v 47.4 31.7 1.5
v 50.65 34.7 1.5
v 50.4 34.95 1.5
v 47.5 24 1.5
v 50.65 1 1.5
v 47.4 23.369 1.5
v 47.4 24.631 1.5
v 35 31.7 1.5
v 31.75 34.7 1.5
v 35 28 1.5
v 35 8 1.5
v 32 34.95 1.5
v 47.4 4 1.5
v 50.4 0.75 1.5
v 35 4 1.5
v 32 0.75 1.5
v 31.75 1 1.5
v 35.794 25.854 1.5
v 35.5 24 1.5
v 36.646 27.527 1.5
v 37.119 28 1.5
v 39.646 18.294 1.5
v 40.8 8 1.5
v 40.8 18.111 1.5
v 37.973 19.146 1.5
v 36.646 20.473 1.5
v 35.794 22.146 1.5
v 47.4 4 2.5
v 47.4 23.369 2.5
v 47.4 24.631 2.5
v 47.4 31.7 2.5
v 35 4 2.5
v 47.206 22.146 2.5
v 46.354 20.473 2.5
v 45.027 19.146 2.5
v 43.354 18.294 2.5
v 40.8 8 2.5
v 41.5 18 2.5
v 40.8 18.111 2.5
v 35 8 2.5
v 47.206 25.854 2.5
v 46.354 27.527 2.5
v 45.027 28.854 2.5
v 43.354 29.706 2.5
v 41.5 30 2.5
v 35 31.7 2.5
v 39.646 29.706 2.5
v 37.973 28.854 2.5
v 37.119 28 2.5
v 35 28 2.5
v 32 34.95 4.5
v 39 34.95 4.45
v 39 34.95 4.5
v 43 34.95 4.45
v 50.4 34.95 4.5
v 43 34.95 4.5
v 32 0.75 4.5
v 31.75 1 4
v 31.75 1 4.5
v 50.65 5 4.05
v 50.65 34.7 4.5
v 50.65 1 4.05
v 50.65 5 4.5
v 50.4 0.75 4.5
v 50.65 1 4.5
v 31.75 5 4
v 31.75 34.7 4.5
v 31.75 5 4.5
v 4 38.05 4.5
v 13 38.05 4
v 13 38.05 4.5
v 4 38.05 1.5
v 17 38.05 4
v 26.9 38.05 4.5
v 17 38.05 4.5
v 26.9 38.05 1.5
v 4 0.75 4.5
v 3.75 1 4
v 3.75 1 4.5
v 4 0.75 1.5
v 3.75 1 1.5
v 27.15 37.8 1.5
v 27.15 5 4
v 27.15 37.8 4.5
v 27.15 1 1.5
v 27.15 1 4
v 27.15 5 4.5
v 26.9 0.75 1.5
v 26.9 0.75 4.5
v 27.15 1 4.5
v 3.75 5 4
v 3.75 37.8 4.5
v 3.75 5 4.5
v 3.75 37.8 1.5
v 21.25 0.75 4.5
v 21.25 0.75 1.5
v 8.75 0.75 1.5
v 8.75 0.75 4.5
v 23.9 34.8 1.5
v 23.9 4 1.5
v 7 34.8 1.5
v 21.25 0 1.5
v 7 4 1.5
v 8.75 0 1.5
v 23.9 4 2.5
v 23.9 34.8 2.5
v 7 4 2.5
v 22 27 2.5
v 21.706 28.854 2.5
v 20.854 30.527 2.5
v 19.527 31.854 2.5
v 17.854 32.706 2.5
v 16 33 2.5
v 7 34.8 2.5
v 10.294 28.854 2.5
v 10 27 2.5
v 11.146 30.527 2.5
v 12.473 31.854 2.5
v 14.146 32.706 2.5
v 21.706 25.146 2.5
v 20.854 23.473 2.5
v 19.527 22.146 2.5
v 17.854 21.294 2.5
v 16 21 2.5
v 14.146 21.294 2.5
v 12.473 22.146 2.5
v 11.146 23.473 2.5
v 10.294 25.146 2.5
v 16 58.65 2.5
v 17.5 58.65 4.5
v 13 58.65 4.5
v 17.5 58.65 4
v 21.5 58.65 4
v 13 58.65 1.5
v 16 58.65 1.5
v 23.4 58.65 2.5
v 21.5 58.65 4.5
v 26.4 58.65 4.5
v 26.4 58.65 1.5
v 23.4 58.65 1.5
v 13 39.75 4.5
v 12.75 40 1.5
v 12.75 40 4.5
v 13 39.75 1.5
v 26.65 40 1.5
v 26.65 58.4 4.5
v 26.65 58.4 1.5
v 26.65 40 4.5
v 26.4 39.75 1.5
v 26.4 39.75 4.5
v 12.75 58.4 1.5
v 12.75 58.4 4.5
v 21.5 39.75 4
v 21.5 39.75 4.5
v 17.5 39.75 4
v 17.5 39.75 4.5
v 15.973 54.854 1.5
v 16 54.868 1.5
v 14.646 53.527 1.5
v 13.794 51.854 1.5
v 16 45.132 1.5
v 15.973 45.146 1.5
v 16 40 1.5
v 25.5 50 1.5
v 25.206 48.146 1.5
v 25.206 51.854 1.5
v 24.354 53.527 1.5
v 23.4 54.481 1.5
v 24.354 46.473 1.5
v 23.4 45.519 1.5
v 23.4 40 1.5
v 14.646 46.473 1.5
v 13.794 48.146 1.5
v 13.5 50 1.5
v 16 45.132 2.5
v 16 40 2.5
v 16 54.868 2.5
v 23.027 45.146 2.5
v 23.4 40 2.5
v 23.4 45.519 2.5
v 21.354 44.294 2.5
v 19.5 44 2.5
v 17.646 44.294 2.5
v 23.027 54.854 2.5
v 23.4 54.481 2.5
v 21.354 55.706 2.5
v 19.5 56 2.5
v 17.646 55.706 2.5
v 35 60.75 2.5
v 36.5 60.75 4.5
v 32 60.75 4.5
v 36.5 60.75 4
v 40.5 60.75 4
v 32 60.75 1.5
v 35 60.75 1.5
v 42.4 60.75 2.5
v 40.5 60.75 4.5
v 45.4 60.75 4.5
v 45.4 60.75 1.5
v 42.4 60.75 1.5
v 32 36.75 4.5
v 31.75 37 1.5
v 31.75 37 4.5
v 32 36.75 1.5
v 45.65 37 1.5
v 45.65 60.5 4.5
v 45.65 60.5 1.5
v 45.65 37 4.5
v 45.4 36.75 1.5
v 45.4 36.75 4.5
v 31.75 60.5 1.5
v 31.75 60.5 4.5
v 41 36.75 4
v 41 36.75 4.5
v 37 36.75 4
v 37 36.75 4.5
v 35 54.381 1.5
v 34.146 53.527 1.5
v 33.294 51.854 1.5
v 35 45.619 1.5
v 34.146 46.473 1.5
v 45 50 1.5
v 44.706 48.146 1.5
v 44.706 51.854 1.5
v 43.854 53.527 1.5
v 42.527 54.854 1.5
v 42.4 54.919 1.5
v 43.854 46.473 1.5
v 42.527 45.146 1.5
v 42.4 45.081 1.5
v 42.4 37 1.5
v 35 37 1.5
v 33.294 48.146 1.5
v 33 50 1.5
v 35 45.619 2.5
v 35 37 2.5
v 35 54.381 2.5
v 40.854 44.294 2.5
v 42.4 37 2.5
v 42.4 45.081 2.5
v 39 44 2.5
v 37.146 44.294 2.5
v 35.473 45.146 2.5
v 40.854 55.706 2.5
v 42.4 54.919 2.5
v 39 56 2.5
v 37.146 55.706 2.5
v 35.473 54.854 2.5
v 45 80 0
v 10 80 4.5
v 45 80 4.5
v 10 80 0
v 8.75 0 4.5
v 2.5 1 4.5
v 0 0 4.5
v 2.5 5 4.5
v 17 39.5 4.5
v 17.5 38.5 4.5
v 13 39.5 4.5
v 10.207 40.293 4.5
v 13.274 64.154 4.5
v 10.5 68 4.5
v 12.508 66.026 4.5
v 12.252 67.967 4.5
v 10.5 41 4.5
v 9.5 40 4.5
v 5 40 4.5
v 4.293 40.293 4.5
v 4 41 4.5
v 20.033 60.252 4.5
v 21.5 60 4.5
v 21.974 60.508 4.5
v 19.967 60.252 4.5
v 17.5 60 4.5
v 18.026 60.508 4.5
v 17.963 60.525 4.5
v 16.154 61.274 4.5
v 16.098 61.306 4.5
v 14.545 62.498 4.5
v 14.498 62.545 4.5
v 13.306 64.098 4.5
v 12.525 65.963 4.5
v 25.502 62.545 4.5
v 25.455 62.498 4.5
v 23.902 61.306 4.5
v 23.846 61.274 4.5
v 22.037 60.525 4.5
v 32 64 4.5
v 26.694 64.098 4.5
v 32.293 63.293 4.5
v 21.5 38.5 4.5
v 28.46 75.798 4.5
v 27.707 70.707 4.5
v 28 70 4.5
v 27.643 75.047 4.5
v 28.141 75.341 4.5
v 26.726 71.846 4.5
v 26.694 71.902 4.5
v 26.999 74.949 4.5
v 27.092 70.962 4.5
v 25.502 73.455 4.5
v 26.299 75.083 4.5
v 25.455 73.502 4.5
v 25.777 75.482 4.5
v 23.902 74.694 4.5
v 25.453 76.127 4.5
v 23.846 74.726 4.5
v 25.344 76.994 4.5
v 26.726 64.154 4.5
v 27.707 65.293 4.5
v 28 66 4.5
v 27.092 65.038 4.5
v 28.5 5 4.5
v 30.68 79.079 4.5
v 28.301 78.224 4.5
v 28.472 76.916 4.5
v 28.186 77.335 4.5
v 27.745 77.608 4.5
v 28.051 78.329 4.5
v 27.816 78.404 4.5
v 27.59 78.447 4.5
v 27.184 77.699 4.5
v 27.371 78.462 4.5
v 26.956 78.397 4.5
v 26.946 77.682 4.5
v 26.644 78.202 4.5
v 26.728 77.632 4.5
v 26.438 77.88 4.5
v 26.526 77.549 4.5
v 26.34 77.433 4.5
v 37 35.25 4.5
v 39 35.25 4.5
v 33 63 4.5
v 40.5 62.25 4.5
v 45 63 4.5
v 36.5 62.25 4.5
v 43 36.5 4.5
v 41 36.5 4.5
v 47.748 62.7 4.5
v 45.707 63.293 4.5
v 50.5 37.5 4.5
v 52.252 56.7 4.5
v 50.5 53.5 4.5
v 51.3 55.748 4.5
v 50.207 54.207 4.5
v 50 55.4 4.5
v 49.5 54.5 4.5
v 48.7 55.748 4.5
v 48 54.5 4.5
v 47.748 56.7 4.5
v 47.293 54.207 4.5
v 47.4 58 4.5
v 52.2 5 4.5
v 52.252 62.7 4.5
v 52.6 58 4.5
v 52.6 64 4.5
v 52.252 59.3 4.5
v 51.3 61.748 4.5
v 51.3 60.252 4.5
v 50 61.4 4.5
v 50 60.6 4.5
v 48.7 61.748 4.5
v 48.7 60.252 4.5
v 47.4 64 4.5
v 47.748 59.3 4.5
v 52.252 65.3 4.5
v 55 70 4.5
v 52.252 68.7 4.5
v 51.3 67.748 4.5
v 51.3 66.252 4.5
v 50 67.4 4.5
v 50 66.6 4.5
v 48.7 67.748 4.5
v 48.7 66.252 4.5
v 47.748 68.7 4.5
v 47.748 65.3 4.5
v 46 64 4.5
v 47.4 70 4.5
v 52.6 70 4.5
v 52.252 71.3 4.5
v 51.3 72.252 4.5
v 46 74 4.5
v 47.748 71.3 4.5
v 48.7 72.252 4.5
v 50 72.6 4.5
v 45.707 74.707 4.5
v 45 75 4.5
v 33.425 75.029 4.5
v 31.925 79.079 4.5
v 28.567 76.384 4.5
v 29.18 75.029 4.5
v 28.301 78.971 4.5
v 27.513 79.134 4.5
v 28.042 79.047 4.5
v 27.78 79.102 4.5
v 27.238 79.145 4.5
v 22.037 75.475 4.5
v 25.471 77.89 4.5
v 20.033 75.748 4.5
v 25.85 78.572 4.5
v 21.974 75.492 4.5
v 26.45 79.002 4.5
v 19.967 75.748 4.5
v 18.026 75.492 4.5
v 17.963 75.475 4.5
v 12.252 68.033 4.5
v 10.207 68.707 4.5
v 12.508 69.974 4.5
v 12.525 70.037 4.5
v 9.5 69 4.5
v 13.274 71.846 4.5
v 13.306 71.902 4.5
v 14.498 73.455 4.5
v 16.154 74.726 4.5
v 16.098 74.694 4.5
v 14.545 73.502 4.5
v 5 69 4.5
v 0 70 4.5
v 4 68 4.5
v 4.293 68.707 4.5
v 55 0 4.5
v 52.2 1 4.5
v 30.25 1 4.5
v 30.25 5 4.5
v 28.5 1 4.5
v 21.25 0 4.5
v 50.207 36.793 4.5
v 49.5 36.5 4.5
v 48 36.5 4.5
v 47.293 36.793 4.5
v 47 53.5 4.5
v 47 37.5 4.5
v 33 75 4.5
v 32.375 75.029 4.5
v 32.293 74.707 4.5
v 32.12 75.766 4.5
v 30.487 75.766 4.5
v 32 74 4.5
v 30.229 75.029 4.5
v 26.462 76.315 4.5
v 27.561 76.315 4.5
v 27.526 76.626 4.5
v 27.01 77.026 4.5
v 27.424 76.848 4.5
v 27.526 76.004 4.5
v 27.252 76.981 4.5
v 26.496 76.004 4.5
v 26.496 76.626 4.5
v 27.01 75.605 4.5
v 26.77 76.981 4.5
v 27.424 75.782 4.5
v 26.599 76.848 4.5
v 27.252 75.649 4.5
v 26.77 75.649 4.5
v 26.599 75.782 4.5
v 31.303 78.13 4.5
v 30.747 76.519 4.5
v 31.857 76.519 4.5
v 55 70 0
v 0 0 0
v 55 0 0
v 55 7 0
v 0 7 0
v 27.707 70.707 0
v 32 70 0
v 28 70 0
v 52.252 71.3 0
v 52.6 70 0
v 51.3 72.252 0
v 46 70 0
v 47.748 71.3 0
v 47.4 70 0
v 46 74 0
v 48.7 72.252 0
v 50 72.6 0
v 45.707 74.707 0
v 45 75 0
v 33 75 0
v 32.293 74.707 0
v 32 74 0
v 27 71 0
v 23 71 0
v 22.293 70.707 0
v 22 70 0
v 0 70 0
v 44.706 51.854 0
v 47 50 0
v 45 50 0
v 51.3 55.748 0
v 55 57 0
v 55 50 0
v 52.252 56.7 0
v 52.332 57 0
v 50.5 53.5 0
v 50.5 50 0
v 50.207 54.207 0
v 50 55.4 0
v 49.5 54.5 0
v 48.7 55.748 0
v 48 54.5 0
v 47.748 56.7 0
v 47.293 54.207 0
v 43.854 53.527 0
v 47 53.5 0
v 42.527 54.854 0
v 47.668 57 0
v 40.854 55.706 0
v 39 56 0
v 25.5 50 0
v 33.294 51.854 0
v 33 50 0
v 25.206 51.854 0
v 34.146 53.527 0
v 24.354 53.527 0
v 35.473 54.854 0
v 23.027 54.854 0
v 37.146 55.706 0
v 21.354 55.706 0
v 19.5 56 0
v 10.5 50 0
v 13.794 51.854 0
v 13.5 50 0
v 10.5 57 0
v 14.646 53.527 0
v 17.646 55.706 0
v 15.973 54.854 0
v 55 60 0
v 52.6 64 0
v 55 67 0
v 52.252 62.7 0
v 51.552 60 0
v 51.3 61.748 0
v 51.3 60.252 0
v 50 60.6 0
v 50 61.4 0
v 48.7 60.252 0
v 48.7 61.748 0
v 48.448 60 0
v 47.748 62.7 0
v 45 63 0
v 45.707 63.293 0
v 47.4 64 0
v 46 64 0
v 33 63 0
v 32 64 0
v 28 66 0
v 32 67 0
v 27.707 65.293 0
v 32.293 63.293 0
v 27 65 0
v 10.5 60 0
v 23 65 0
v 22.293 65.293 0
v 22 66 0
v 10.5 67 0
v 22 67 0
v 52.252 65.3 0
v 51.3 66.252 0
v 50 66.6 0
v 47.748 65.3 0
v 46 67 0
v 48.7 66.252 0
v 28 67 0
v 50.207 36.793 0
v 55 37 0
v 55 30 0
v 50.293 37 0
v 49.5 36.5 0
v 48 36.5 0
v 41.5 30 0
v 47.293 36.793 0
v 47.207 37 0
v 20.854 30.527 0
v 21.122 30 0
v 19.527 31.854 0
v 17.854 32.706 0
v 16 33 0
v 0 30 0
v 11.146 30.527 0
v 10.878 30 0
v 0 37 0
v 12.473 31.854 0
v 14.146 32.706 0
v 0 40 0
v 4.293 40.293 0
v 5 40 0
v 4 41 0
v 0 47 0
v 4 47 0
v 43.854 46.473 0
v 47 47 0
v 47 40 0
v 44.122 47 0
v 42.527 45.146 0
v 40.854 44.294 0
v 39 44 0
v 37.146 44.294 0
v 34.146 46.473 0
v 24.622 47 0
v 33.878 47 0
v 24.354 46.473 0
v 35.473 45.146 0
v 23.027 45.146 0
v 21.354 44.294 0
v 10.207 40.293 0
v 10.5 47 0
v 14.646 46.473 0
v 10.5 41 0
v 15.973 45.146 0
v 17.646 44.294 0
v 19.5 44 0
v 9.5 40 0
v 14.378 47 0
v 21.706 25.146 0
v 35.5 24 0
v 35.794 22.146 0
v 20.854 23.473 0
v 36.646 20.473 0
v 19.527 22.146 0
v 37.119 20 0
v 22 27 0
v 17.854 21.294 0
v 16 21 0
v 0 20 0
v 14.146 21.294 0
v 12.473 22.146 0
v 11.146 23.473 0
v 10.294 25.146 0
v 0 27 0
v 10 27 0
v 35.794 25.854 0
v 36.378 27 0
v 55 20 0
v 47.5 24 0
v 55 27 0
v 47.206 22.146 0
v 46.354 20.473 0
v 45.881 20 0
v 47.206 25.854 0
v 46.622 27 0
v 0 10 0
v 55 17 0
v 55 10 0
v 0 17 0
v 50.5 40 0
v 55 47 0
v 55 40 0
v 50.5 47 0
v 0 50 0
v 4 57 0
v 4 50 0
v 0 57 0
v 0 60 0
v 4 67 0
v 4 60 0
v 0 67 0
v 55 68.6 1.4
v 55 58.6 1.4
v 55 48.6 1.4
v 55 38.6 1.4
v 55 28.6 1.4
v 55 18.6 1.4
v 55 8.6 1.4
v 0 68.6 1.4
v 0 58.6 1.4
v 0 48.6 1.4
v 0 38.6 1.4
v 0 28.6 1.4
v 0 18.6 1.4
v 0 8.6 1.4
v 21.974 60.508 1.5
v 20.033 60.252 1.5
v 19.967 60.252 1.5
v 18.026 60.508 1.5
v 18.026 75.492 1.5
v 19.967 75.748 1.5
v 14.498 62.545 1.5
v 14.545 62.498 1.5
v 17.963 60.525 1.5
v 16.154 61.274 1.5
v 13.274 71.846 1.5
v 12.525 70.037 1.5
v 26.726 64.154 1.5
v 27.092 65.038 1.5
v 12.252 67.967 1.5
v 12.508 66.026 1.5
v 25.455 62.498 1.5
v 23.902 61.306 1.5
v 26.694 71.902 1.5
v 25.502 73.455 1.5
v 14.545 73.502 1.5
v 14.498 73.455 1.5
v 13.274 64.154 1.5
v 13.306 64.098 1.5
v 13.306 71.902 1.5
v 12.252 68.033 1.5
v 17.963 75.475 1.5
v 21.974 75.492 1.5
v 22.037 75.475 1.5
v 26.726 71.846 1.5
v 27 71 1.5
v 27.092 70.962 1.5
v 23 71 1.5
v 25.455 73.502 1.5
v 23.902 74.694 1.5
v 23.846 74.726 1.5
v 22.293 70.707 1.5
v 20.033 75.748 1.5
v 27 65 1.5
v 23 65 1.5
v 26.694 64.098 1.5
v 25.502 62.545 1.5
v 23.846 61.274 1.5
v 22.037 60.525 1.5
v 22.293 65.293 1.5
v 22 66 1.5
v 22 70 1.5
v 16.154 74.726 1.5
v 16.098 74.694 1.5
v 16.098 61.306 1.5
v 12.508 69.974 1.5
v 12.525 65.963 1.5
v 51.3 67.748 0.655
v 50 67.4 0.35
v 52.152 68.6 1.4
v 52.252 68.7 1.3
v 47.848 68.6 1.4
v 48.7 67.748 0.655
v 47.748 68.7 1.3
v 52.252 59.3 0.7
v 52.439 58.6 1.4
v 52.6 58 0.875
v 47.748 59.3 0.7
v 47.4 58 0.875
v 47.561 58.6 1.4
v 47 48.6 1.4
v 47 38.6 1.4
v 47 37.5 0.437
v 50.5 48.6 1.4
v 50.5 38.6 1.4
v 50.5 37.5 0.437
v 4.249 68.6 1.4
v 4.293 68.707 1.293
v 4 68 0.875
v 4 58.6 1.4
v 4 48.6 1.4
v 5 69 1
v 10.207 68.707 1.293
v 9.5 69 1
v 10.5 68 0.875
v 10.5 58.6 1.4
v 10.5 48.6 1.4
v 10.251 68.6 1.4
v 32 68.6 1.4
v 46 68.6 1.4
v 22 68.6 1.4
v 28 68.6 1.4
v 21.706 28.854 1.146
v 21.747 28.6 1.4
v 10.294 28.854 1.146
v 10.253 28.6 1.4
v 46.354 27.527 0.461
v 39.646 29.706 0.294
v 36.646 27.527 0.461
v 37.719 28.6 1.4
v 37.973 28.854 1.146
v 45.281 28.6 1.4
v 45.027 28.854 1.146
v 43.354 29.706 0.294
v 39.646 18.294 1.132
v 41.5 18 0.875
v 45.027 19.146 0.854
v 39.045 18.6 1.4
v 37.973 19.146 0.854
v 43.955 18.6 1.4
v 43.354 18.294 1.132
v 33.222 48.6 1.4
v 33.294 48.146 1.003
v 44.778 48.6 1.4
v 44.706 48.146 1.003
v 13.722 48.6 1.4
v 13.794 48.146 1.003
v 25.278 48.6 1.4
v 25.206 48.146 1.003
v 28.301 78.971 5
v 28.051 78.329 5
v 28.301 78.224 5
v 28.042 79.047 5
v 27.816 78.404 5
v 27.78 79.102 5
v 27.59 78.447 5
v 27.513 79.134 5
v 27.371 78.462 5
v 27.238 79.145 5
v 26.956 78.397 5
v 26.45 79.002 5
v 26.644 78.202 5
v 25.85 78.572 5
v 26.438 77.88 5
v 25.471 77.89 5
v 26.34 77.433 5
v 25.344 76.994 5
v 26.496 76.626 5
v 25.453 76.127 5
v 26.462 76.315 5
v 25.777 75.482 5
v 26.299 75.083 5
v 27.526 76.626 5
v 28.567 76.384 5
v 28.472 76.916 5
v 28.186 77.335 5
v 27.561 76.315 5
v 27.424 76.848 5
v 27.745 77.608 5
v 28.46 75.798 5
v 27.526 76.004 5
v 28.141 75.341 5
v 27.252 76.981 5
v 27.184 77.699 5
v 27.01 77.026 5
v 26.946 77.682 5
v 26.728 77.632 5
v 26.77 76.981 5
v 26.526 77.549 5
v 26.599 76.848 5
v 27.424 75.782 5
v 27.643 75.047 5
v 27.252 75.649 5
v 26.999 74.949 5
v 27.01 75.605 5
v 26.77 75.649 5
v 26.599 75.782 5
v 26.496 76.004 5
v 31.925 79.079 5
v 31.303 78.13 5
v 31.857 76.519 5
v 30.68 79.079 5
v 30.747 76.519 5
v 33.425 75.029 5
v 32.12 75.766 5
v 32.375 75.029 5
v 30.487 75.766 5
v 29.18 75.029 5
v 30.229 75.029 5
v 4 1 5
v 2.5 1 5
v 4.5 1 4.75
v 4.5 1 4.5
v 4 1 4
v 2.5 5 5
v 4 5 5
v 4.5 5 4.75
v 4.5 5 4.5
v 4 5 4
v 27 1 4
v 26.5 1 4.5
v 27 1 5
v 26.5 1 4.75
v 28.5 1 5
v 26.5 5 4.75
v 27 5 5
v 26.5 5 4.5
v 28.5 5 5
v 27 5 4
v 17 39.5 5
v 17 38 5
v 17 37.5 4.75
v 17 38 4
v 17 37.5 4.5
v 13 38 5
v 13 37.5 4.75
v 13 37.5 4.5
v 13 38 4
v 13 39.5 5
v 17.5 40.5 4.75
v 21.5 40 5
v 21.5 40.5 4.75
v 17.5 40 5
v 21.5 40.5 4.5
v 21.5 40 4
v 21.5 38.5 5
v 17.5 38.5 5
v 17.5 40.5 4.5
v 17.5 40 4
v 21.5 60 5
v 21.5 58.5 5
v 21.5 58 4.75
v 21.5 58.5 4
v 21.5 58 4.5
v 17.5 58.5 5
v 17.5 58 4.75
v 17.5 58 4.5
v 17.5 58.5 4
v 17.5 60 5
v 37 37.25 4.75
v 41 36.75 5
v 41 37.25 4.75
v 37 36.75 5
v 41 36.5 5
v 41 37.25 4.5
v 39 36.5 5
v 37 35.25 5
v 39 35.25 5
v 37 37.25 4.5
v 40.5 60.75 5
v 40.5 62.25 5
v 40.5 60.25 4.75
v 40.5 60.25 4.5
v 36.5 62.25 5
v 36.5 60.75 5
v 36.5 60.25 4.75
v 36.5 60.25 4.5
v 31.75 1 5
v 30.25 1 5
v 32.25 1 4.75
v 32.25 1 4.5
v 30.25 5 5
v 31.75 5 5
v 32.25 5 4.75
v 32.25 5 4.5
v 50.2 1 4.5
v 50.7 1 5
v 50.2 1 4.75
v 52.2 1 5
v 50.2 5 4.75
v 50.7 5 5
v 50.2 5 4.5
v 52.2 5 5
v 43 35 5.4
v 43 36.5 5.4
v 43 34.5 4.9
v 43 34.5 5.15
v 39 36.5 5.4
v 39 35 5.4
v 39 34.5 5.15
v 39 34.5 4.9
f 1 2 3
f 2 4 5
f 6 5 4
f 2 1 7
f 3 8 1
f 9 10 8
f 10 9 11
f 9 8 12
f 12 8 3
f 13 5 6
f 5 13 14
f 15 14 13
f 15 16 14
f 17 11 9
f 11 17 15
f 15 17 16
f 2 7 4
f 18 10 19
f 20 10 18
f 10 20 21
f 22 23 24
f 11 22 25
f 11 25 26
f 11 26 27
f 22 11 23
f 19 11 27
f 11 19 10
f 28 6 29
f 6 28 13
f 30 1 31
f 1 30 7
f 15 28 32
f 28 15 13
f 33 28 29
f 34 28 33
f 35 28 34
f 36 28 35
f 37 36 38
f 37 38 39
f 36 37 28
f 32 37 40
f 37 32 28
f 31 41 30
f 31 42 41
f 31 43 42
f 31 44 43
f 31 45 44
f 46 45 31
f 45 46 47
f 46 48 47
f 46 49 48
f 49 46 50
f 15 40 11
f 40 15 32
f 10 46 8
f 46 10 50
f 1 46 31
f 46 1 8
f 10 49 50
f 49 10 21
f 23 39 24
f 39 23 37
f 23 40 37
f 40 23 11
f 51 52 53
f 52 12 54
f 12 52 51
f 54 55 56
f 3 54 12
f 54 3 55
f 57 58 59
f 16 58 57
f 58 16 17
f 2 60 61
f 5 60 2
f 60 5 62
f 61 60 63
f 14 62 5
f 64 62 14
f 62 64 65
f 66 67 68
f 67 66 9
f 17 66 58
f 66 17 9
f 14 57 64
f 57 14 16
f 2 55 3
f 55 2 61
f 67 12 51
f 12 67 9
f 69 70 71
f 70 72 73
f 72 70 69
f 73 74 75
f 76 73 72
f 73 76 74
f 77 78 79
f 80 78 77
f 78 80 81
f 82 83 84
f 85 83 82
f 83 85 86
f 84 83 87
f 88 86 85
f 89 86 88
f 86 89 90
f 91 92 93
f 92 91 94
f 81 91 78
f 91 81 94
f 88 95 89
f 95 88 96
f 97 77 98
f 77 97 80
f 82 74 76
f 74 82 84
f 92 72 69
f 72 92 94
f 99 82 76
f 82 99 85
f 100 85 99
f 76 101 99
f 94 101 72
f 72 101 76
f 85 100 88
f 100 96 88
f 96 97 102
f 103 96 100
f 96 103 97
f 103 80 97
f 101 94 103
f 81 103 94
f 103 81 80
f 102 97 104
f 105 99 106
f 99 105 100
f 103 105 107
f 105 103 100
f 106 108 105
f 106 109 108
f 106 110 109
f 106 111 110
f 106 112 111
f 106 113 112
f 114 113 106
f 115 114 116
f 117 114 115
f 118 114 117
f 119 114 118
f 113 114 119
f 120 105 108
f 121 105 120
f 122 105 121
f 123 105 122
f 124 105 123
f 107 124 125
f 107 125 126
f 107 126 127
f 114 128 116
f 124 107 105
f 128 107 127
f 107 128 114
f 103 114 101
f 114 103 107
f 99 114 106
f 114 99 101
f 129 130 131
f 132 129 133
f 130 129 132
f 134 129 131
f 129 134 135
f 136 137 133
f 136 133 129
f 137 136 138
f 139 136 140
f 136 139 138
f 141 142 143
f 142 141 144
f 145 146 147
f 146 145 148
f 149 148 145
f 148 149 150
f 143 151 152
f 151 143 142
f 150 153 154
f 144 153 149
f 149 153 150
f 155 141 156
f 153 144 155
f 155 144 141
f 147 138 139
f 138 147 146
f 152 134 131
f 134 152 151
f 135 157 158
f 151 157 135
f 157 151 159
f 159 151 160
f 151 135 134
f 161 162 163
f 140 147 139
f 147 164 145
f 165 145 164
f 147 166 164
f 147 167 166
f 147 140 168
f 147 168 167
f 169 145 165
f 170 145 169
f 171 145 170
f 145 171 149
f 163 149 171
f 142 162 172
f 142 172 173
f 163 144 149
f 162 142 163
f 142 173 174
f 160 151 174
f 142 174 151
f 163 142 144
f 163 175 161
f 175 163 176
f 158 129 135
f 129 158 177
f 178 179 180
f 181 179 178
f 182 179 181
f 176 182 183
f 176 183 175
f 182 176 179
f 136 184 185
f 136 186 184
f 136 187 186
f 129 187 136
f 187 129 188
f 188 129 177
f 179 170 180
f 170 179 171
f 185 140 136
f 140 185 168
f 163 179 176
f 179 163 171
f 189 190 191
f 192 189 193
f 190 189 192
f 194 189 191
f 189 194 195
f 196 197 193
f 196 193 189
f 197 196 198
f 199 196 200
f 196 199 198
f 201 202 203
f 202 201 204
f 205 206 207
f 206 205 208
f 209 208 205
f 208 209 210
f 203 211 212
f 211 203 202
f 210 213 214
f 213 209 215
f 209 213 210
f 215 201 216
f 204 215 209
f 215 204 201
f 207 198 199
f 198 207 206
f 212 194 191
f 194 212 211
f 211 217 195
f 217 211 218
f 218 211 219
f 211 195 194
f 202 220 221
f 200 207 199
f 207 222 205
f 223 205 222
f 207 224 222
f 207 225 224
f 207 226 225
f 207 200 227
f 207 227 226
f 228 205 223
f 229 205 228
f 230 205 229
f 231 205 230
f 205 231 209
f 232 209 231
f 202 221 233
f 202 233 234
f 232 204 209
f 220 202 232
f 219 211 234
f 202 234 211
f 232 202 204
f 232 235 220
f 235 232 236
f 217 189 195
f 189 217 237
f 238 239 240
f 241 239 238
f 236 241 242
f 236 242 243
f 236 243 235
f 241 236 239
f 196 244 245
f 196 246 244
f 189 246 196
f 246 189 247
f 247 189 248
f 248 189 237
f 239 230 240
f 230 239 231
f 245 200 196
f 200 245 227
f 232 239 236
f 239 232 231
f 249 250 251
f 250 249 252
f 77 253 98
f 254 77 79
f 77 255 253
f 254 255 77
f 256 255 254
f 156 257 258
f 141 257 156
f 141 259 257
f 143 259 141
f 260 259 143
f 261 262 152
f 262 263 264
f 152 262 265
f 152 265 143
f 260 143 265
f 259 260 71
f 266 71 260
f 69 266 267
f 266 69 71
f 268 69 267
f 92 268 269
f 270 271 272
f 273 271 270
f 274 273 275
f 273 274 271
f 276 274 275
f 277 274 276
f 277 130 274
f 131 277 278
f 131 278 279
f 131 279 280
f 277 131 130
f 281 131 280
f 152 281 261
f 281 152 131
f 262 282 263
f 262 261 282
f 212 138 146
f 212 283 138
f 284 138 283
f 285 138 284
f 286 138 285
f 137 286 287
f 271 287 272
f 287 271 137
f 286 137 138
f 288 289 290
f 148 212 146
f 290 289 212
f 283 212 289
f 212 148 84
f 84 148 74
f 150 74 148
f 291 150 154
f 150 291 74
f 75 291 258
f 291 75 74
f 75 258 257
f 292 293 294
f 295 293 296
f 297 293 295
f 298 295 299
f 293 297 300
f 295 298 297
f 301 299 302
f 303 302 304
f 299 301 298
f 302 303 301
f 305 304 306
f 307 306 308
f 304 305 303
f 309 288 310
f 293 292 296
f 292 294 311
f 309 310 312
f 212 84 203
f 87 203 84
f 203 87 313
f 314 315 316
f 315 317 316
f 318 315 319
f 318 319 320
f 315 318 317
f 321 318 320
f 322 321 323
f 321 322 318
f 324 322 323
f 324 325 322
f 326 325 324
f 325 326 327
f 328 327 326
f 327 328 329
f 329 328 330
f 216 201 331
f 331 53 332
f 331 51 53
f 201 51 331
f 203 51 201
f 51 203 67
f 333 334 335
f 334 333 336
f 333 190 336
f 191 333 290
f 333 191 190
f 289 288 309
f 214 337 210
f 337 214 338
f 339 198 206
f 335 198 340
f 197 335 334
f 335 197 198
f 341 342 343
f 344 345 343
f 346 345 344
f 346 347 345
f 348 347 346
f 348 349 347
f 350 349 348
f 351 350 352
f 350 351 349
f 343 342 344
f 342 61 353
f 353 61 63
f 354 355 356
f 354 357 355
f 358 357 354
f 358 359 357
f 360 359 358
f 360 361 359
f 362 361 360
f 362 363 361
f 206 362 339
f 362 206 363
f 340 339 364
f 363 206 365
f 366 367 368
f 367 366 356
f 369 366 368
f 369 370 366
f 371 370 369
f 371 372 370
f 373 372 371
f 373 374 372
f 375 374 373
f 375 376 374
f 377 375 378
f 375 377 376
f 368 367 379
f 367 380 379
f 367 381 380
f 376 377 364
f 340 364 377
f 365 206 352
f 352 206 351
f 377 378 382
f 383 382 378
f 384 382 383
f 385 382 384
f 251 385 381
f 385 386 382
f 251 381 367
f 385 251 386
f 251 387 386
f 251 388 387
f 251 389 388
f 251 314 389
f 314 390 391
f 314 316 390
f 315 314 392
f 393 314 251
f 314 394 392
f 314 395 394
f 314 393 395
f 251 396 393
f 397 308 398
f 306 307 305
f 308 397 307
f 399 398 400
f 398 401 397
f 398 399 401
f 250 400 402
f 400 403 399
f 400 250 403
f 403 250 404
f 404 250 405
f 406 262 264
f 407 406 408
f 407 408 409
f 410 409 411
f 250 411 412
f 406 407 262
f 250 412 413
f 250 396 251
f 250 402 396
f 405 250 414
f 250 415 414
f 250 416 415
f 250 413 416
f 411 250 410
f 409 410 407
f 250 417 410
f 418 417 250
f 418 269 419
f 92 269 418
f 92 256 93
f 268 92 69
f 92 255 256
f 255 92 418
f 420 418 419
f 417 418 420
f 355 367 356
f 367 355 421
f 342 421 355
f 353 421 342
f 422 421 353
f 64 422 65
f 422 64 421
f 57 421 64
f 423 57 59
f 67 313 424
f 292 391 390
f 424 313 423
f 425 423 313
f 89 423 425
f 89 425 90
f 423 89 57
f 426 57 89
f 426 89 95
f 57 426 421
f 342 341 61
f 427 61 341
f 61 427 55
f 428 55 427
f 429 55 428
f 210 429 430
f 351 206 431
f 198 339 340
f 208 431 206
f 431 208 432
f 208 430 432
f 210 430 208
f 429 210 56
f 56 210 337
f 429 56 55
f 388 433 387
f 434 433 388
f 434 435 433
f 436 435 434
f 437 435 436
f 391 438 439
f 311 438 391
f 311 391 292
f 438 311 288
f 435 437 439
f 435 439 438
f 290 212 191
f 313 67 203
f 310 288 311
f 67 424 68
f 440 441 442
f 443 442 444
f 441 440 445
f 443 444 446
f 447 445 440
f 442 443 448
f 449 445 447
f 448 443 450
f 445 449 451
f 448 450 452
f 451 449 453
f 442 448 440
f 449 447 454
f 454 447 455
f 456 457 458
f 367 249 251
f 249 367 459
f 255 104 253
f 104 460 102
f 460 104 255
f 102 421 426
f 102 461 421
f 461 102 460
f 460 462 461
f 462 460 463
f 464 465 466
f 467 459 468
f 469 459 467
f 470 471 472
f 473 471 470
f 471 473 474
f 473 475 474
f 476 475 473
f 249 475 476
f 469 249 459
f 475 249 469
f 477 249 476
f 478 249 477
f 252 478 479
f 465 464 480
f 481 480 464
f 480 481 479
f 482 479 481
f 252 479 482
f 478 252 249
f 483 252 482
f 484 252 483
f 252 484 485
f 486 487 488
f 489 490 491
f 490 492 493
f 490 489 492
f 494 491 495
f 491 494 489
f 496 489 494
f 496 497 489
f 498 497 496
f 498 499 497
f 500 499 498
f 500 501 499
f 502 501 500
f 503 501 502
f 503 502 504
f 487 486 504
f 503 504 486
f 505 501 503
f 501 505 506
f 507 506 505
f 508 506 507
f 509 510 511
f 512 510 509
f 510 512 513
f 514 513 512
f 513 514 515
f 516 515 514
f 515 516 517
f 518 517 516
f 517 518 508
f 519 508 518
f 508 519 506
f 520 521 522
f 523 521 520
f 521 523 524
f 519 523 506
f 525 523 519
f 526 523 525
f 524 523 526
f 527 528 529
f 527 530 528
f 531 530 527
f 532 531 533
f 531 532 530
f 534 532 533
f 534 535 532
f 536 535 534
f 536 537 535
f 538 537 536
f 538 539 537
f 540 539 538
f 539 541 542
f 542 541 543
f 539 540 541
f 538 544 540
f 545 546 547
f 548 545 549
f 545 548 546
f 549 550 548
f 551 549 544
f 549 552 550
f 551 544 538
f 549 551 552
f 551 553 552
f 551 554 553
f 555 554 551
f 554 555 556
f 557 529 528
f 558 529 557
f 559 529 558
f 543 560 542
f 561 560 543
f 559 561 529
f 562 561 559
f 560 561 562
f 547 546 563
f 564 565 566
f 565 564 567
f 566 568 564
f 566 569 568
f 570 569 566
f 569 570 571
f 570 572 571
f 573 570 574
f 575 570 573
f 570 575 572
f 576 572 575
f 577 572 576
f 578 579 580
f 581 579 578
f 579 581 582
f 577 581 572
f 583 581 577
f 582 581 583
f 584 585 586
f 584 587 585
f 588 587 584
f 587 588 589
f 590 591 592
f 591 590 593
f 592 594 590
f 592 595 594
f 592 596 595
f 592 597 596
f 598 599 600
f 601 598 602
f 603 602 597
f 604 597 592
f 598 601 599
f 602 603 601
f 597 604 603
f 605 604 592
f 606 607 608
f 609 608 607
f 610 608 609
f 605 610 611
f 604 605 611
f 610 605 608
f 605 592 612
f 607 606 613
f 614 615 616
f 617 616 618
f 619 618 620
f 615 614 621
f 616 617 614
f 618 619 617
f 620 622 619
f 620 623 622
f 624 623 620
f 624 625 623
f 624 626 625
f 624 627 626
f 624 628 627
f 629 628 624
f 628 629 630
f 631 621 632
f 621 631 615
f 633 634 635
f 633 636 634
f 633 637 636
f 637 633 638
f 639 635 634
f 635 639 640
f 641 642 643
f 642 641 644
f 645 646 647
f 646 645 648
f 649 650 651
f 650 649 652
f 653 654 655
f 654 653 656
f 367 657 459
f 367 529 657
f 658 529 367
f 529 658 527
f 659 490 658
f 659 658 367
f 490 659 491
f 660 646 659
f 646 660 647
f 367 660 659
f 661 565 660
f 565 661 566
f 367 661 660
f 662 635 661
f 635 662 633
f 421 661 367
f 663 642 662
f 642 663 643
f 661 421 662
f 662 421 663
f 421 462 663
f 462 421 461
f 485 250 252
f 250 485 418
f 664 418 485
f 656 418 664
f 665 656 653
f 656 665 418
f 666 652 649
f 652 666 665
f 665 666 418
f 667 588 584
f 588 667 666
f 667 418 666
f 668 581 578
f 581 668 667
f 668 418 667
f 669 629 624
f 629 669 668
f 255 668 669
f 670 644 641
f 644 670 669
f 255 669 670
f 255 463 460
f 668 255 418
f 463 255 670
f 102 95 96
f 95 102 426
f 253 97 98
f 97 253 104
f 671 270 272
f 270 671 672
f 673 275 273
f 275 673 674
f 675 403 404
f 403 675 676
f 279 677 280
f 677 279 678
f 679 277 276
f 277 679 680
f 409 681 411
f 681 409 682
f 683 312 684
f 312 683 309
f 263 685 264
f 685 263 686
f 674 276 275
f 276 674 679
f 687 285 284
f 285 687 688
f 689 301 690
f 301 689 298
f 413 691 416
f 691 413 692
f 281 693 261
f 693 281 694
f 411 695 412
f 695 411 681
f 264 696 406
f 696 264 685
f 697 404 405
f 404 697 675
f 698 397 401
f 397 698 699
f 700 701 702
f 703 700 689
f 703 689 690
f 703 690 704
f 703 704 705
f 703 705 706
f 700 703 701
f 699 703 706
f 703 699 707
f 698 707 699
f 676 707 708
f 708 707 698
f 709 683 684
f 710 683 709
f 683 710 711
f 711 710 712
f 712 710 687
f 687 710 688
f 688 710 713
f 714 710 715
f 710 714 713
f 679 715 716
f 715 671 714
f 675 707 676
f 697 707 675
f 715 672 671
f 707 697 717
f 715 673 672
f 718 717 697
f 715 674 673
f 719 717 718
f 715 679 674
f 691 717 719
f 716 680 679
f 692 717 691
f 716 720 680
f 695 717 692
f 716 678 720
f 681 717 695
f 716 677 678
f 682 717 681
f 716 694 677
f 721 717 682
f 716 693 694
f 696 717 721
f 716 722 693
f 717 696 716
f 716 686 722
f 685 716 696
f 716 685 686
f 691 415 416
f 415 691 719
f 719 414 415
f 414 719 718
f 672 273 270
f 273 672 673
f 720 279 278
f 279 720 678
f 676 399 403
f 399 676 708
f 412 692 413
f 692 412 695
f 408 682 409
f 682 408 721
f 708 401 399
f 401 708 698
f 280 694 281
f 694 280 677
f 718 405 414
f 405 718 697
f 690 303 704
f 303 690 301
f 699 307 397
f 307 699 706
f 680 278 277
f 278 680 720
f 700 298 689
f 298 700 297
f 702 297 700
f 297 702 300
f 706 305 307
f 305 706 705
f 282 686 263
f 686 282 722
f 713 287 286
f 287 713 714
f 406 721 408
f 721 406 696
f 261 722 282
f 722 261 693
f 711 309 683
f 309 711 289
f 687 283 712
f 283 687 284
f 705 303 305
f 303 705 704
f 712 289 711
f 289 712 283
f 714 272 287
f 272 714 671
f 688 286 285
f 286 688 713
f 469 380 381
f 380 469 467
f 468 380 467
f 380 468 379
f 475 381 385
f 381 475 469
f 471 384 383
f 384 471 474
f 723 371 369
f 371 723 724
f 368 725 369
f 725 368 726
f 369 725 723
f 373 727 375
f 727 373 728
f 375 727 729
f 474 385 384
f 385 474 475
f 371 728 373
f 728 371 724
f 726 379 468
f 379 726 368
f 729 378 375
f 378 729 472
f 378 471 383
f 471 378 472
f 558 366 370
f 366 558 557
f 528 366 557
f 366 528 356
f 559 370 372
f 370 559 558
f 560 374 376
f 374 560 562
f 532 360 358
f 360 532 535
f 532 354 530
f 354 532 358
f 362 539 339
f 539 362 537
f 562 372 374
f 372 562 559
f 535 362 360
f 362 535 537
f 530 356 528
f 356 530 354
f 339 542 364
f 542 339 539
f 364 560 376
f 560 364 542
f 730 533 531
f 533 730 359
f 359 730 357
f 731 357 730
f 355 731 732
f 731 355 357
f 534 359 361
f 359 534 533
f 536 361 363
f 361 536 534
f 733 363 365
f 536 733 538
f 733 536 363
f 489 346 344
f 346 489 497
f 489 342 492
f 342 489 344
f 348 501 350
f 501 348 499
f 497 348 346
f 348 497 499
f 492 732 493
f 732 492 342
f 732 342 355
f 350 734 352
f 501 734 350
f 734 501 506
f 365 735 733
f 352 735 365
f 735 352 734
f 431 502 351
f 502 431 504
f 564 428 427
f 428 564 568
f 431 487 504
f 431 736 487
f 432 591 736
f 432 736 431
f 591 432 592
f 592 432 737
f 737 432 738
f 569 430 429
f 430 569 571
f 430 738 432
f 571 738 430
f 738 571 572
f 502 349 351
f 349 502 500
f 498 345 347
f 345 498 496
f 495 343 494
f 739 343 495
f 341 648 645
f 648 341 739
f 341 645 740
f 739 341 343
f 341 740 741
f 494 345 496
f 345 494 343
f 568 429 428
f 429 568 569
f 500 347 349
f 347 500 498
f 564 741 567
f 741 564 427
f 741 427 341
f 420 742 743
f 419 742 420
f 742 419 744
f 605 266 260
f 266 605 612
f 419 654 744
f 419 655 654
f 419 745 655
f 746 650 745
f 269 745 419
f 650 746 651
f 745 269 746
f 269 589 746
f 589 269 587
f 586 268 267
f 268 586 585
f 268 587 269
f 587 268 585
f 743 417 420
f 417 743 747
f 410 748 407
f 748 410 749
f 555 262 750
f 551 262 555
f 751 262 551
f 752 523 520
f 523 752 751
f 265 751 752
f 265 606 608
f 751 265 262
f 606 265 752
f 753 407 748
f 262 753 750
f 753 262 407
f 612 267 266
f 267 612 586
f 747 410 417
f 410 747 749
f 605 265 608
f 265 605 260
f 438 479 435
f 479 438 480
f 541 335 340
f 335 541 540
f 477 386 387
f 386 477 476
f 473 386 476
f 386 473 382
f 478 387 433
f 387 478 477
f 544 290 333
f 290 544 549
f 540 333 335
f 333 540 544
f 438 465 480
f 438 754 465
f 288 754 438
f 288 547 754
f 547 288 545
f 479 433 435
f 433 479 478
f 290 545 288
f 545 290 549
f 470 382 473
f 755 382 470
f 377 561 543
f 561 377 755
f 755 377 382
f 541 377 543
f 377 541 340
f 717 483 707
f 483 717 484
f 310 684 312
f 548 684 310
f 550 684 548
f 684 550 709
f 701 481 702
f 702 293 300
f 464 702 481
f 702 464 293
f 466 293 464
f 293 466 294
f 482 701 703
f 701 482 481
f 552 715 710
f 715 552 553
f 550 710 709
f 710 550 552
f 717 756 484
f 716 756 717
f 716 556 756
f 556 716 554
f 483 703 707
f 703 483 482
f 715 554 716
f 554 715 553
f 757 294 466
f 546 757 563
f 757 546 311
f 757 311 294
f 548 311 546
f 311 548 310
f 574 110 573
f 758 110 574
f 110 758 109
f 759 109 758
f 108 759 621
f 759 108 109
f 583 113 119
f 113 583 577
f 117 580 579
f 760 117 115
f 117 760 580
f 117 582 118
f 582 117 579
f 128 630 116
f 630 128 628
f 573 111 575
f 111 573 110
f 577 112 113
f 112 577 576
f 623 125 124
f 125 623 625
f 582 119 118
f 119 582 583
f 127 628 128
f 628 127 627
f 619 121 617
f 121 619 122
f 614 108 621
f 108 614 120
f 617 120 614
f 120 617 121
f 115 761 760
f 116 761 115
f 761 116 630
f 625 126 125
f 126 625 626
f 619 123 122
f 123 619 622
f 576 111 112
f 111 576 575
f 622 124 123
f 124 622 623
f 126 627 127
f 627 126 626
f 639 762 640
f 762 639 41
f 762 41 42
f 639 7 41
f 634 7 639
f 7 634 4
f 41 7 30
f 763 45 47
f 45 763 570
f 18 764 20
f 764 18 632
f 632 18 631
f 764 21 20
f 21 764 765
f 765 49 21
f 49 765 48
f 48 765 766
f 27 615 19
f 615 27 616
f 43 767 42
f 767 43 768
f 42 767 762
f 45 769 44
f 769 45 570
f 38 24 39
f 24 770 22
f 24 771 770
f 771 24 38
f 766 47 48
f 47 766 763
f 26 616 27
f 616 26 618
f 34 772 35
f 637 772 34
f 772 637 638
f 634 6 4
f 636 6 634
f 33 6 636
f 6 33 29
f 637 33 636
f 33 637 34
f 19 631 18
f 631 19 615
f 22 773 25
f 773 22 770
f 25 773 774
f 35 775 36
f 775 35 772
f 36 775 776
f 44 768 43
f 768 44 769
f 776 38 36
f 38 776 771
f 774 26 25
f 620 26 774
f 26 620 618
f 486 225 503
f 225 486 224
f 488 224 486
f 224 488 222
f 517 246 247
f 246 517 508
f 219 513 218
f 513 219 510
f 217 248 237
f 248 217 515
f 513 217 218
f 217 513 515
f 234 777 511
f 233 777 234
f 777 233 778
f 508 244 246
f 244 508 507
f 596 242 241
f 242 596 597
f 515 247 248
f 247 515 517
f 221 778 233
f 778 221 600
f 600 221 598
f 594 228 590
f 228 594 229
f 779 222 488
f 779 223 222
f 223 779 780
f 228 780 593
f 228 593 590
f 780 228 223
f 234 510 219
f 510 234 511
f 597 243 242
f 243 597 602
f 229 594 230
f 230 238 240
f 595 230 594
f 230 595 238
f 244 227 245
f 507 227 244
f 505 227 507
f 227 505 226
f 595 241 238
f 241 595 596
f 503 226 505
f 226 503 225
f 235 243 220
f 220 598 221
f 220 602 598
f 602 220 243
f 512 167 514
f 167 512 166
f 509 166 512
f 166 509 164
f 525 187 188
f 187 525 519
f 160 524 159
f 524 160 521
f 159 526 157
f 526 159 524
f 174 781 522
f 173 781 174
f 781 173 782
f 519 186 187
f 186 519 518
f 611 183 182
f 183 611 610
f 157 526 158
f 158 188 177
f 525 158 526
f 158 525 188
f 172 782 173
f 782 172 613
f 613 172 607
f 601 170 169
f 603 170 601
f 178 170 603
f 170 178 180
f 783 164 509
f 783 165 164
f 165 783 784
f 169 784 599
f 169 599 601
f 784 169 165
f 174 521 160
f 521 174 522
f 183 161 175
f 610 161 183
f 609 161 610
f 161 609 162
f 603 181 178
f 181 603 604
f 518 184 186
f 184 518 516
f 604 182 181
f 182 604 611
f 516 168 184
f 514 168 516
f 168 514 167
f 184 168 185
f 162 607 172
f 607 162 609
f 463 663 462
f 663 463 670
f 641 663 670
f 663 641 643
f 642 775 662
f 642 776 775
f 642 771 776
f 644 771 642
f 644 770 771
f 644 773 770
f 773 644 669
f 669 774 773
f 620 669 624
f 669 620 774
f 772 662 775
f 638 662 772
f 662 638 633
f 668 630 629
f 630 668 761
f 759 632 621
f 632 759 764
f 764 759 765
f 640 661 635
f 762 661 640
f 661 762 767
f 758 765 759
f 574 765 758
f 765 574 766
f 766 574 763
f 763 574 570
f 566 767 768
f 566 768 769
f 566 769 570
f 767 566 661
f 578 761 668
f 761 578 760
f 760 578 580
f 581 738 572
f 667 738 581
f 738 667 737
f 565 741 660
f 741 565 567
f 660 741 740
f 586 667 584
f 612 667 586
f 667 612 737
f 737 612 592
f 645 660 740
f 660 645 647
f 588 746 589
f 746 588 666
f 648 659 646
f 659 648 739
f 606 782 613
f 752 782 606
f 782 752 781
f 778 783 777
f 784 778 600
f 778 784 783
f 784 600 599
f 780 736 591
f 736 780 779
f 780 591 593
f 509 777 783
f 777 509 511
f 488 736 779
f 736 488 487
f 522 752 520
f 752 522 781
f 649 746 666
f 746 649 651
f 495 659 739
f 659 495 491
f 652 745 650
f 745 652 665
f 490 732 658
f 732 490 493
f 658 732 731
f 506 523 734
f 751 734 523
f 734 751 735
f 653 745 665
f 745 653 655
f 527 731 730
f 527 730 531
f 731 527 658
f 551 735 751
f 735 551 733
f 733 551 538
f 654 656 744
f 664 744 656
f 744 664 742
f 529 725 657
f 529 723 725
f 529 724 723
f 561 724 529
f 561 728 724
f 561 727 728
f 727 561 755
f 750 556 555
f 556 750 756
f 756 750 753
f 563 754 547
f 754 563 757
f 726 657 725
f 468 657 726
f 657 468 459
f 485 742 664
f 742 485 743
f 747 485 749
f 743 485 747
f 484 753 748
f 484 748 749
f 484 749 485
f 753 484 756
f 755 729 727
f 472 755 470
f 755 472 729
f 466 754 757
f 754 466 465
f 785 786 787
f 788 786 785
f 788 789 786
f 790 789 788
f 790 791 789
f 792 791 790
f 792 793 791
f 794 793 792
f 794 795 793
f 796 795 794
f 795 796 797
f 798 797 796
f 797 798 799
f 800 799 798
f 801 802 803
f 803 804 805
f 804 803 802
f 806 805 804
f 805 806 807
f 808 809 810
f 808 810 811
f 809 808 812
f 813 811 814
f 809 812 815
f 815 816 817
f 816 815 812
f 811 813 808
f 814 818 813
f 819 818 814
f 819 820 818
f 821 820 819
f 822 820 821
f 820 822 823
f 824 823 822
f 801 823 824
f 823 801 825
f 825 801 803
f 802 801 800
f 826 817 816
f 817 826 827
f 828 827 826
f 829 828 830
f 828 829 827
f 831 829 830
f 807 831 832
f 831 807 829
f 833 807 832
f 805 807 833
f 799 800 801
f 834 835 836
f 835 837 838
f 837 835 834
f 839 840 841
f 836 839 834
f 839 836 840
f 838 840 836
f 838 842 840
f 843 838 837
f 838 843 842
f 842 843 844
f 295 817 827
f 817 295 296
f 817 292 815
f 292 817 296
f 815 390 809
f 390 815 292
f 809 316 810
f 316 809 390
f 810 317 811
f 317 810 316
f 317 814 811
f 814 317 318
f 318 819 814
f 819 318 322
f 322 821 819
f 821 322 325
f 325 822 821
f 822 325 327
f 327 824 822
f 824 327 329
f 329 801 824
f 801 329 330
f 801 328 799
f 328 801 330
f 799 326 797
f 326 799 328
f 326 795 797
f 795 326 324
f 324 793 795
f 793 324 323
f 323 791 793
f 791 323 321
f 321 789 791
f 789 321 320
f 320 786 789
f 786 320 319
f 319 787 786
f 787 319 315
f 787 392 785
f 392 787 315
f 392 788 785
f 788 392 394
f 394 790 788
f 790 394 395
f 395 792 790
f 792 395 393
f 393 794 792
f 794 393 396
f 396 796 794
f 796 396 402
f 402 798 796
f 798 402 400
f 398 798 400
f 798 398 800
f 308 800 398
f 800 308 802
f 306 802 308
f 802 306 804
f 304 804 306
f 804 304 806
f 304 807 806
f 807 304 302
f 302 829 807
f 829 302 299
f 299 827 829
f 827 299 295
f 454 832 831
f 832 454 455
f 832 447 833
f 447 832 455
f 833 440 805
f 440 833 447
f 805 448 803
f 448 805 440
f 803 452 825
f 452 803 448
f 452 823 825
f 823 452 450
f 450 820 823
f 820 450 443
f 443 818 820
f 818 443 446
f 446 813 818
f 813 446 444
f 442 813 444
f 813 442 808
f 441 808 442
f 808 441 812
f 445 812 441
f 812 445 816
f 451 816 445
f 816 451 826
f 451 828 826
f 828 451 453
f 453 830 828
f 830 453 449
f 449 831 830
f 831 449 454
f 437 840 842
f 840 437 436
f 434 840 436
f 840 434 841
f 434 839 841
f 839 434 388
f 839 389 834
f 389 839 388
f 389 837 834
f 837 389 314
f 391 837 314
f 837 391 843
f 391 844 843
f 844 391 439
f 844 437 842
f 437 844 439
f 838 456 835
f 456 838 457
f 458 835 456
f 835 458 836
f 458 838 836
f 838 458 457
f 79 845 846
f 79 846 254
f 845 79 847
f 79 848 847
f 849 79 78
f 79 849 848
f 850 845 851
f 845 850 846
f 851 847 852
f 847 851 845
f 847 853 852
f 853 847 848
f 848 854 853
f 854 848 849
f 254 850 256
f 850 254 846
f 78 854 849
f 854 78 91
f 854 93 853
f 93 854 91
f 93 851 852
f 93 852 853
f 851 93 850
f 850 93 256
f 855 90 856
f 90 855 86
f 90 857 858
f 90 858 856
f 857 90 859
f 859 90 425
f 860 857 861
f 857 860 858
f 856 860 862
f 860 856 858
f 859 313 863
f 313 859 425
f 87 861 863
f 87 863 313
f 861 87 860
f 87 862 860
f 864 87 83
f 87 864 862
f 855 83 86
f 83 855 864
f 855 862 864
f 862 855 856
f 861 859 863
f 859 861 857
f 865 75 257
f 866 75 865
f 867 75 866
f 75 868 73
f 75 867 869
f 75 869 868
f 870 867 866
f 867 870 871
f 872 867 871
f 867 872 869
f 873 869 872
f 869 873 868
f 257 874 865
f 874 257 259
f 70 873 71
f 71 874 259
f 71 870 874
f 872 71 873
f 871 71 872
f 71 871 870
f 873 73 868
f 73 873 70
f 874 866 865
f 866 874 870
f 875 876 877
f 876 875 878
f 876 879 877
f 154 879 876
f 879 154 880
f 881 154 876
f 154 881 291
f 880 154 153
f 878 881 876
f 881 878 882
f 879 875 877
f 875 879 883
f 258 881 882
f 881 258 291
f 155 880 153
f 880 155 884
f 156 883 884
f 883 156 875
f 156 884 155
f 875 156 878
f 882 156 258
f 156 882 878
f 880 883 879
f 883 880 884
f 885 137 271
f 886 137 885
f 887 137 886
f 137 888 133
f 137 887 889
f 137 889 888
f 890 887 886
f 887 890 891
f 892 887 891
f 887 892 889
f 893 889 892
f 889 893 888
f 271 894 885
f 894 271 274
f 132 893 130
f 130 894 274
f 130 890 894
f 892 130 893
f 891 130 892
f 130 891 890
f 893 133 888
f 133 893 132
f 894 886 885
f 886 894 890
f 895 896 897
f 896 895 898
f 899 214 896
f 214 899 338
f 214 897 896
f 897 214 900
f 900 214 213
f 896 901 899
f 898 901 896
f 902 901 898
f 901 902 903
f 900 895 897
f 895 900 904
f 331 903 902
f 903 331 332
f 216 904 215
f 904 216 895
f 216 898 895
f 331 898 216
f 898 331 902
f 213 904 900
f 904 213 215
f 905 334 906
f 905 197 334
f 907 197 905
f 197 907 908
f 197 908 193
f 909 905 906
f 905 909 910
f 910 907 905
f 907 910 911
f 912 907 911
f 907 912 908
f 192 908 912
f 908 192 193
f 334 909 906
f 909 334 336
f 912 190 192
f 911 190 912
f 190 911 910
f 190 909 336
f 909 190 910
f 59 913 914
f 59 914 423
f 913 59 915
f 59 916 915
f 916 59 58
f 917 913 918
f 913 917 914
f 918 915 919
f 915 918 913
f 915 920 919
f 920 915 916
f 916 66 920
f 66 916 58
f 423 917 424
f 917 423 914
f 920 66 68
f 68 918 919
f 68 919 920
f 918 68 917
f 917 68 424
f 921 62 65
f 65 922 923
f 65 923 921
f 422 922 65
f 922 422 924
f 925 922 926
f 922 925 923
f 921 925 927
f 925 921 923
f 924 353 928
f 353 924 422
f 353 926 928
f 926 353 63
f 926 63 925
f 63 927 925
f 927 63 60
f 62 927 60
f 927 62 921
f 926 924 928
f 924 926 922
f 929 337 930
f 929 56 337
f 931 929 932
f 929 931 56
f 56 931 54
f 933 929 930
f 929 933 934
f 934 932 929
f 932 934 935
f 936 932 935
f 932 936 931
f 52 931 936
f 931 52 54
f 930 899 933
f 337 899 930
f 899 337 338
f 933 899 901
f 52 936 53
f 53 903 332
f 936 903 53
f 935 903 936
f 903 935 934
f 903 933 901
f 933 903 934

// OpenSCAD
tol=0.25;
extra=4;


difference(){   // cut the board and components out of 
    // the base plate #1
    
// Base 1 plate
B1p=[ [0,0], [55,0], [55,70], [45,80],
[10,80], [0,70] ];
translate([0,0,0]) color("gray")
linear_extrude(height=4.5)
polygon(points=B1p);

//union(){
// Pro Mini
translate([32,1,1.5]) color("red"){
    difference(){
        linear_extrude(height=0.86+extra) 
        offset(r=tol) square(size=[18.4, 33.7]);

        difference(){
        linear_extrude(height=1) 
        offset(r=-3) square(size=[18.4, 33.7]);

        linear_extrude(height=1) 
        translate([2.8,7,0]) square(size=[6,20]);
        }

    }
}

// Adafruit PowerBoost 1000c
translate([4,1,1.5]) color("blue"){
    difference(){
        linear_extrude(height=1.7+extra) 
        offset(r=tol) square(size=[22.9, 36.8]);

        linear_extrude(height=1) 
        offset(r=-3) square(size=[22.9, 36.8]);
    }
}
// notch for the USB charger cable
translate([9,0,1.5]) color("pink"){
    linear_extrude(height=1.7+extra) 
        offset(r=tol) square(size=[12, 2]);
}

// TXB0104 Level Shifter
translate([13,40,1.5]) color("green") {
    difference(){
        linear_extrude(height=1.7+extra) 
        offset(r=tol) square(size=[13.4, 18.4]);
            
        linear_extrude(height=1) 
        translate([3,0,0]) square(size=[7.4, 22]);
    }
}

// LIS3DH
translate([32,37,1.5]) color("yellow") {
    difference(){
        linear_extrude(height=1.7+extra) 
        offset(r=tol) square(size=[13.4, 23.5]);
            
        linear_extrude(height=1) 
        translate([3,0,0]) square(size=[7.4, 26]);
    } 
}

// Piezo
translate([20,68,1.5]) color("orange") {
    linear_extrude(height=1.4+extra) 
    offset(r=tol)
     circle(r=7.5);
}

// Led holes
translate([50,70,-2]) color("red") {
cylinder(h=8,r=2.6,$fn=12);
}
translate([50,64,-2]) color("yellow") {
cylinder(h=8,r=2.6,$fn=12);
}
translate([50,58,-2]) color("green") {
cylinder(h=8,r=2.6,$fn=12);
}

// Wire Pass-thru also lightweighting
translate([48,37.5,-2]) color("black") {
    linear_extrude(height=12) 
    offset(r=1,$fn=8) square(size=[1.5,16]);
}
translate([5,41,-2]) color("black") {
    linear_extrude(height=12) 
    offset(r=1, $fn=8) square(size=[4.5,27]);
}
translate([33,64,-2]) color("black") {
    linear_extrude(height=12) 
    offset(r=1,$fn=8) square(size=[12,10]);
}
translate([23,66,-2]) color("black") {
    linear_extrude(height=12) 
    offset(r=1,$fn=8) square(size=[4,4]);
}

// Popouts for the boards
translate([16,27,-2]) color("cyan") {
cylinder(h=12,r=6,$fn=20);
}
translate([41.5,24,-2]) color("cyan") {
cylinder(h=12,r=6,$fn=20);
}
translate([39,50,-2]) color("cyan") {
cylinder(h=12,r=6,$fn=20);
}
translate([19.5,50,-2]) color("cyan") {
cylinder(h=12,r=6,$fn=20);
}

// stress relief
pr1=[ [0,0], [-1.4,-1.4], [0,-3] ];
translate([0,10,0]) color("cyan") 
    rotate([0,90,0]) linear_extrude(height=55) polygon(points=pr1);
translate([0,20,0]) color("cyan") 
    rotate([0,90,0]) linear_extrude(height=55) polygon(points=pr1);
translate([0,30,0]) color("cyan") 
    rotate([0,90,0]) linear_extrude(height=55) polygon(points=pr1);
translate([0,40,0]) color("cyan") 
    rotate([0,90,0]) linear_extrude(height=55) polygon(points=pr1);
translate([0,50,0]) color("cyan") 
    rotate([0,90,0]) linear_extrude(height=55) polygon(points=pr1);
translate([0,60,0]) color("cyan") 
    rotate([0,90,0]) linear_extrude(height=55) polygon(points=pr1);
translate([0,70,0]) color("cyan") 
    rotate([0,90,0]) linear_extrude(height=55) polygon(points=pr1);

} // end of diffence

// add text
translate ([25,77,3.5]) color("red") 
    linear_extrude(height=1.5){
    text("6A", font = "Open Sans:style=Bold", size=4,halign="left",valign="center",spacing=1.1);
    }



pt1=[ [0,0], [0.5,0.5], [0.5,0.75], [0,1], [-1.5,1], [-1.5,0] ];
// retainer tabs blue
translate([4,5,4]) color("orange") {
    rotate([90,0,0]) linear_extrude(height=4) polygon(points=pt1);
}
translate([27,1,4]) color("orange") {
    rotate([90,0,180]) linear_extrude(height=4) polygon(points=pt1);
}
translate([17,38,4]) color("orange") {
    rotate([90,0,-90]) linear_extrude(height=4) polygon(points=pt1);
}
    
// retainer tabs green
translate([17.5,40,4]) color("orange") {
    rotate([90,0,90]) linear_extrude(height=4) polygon(points=pt1);
}
translate([21.5,58.5,4]) color("orange") {
    rotate([90,0,-90]) linear_extrude(height=4) polygon(points=pt1);
}

// retainer tabs yellow
translate([37,36.75,4]) color("orange") {
    rotate([90,0,90]) linear_extrude(height=4) polygon(points=pt1);
}
translate([40.5,60.75,4]) color("orange") {
    rotate([90,0,-90]) linear_extrude(height=4) polygon(points=pt1);
}

// retainer tabs red
translate([31.75,5,4]) color("orange") {
    rotate([90,0,0]) linear_extrude(height=4) polygon(points=pt1);
}
translate([50.7,1,4]) color("orange") {
    rotate([90,0,180]) linear_extrude(height=4) polygon(points=pt1);
}
translate([43,35,4.4]) color("orange") {
    rotate([90,0,-90]) linear_extrude(height=4) polygon(points=pt1);
}
    
